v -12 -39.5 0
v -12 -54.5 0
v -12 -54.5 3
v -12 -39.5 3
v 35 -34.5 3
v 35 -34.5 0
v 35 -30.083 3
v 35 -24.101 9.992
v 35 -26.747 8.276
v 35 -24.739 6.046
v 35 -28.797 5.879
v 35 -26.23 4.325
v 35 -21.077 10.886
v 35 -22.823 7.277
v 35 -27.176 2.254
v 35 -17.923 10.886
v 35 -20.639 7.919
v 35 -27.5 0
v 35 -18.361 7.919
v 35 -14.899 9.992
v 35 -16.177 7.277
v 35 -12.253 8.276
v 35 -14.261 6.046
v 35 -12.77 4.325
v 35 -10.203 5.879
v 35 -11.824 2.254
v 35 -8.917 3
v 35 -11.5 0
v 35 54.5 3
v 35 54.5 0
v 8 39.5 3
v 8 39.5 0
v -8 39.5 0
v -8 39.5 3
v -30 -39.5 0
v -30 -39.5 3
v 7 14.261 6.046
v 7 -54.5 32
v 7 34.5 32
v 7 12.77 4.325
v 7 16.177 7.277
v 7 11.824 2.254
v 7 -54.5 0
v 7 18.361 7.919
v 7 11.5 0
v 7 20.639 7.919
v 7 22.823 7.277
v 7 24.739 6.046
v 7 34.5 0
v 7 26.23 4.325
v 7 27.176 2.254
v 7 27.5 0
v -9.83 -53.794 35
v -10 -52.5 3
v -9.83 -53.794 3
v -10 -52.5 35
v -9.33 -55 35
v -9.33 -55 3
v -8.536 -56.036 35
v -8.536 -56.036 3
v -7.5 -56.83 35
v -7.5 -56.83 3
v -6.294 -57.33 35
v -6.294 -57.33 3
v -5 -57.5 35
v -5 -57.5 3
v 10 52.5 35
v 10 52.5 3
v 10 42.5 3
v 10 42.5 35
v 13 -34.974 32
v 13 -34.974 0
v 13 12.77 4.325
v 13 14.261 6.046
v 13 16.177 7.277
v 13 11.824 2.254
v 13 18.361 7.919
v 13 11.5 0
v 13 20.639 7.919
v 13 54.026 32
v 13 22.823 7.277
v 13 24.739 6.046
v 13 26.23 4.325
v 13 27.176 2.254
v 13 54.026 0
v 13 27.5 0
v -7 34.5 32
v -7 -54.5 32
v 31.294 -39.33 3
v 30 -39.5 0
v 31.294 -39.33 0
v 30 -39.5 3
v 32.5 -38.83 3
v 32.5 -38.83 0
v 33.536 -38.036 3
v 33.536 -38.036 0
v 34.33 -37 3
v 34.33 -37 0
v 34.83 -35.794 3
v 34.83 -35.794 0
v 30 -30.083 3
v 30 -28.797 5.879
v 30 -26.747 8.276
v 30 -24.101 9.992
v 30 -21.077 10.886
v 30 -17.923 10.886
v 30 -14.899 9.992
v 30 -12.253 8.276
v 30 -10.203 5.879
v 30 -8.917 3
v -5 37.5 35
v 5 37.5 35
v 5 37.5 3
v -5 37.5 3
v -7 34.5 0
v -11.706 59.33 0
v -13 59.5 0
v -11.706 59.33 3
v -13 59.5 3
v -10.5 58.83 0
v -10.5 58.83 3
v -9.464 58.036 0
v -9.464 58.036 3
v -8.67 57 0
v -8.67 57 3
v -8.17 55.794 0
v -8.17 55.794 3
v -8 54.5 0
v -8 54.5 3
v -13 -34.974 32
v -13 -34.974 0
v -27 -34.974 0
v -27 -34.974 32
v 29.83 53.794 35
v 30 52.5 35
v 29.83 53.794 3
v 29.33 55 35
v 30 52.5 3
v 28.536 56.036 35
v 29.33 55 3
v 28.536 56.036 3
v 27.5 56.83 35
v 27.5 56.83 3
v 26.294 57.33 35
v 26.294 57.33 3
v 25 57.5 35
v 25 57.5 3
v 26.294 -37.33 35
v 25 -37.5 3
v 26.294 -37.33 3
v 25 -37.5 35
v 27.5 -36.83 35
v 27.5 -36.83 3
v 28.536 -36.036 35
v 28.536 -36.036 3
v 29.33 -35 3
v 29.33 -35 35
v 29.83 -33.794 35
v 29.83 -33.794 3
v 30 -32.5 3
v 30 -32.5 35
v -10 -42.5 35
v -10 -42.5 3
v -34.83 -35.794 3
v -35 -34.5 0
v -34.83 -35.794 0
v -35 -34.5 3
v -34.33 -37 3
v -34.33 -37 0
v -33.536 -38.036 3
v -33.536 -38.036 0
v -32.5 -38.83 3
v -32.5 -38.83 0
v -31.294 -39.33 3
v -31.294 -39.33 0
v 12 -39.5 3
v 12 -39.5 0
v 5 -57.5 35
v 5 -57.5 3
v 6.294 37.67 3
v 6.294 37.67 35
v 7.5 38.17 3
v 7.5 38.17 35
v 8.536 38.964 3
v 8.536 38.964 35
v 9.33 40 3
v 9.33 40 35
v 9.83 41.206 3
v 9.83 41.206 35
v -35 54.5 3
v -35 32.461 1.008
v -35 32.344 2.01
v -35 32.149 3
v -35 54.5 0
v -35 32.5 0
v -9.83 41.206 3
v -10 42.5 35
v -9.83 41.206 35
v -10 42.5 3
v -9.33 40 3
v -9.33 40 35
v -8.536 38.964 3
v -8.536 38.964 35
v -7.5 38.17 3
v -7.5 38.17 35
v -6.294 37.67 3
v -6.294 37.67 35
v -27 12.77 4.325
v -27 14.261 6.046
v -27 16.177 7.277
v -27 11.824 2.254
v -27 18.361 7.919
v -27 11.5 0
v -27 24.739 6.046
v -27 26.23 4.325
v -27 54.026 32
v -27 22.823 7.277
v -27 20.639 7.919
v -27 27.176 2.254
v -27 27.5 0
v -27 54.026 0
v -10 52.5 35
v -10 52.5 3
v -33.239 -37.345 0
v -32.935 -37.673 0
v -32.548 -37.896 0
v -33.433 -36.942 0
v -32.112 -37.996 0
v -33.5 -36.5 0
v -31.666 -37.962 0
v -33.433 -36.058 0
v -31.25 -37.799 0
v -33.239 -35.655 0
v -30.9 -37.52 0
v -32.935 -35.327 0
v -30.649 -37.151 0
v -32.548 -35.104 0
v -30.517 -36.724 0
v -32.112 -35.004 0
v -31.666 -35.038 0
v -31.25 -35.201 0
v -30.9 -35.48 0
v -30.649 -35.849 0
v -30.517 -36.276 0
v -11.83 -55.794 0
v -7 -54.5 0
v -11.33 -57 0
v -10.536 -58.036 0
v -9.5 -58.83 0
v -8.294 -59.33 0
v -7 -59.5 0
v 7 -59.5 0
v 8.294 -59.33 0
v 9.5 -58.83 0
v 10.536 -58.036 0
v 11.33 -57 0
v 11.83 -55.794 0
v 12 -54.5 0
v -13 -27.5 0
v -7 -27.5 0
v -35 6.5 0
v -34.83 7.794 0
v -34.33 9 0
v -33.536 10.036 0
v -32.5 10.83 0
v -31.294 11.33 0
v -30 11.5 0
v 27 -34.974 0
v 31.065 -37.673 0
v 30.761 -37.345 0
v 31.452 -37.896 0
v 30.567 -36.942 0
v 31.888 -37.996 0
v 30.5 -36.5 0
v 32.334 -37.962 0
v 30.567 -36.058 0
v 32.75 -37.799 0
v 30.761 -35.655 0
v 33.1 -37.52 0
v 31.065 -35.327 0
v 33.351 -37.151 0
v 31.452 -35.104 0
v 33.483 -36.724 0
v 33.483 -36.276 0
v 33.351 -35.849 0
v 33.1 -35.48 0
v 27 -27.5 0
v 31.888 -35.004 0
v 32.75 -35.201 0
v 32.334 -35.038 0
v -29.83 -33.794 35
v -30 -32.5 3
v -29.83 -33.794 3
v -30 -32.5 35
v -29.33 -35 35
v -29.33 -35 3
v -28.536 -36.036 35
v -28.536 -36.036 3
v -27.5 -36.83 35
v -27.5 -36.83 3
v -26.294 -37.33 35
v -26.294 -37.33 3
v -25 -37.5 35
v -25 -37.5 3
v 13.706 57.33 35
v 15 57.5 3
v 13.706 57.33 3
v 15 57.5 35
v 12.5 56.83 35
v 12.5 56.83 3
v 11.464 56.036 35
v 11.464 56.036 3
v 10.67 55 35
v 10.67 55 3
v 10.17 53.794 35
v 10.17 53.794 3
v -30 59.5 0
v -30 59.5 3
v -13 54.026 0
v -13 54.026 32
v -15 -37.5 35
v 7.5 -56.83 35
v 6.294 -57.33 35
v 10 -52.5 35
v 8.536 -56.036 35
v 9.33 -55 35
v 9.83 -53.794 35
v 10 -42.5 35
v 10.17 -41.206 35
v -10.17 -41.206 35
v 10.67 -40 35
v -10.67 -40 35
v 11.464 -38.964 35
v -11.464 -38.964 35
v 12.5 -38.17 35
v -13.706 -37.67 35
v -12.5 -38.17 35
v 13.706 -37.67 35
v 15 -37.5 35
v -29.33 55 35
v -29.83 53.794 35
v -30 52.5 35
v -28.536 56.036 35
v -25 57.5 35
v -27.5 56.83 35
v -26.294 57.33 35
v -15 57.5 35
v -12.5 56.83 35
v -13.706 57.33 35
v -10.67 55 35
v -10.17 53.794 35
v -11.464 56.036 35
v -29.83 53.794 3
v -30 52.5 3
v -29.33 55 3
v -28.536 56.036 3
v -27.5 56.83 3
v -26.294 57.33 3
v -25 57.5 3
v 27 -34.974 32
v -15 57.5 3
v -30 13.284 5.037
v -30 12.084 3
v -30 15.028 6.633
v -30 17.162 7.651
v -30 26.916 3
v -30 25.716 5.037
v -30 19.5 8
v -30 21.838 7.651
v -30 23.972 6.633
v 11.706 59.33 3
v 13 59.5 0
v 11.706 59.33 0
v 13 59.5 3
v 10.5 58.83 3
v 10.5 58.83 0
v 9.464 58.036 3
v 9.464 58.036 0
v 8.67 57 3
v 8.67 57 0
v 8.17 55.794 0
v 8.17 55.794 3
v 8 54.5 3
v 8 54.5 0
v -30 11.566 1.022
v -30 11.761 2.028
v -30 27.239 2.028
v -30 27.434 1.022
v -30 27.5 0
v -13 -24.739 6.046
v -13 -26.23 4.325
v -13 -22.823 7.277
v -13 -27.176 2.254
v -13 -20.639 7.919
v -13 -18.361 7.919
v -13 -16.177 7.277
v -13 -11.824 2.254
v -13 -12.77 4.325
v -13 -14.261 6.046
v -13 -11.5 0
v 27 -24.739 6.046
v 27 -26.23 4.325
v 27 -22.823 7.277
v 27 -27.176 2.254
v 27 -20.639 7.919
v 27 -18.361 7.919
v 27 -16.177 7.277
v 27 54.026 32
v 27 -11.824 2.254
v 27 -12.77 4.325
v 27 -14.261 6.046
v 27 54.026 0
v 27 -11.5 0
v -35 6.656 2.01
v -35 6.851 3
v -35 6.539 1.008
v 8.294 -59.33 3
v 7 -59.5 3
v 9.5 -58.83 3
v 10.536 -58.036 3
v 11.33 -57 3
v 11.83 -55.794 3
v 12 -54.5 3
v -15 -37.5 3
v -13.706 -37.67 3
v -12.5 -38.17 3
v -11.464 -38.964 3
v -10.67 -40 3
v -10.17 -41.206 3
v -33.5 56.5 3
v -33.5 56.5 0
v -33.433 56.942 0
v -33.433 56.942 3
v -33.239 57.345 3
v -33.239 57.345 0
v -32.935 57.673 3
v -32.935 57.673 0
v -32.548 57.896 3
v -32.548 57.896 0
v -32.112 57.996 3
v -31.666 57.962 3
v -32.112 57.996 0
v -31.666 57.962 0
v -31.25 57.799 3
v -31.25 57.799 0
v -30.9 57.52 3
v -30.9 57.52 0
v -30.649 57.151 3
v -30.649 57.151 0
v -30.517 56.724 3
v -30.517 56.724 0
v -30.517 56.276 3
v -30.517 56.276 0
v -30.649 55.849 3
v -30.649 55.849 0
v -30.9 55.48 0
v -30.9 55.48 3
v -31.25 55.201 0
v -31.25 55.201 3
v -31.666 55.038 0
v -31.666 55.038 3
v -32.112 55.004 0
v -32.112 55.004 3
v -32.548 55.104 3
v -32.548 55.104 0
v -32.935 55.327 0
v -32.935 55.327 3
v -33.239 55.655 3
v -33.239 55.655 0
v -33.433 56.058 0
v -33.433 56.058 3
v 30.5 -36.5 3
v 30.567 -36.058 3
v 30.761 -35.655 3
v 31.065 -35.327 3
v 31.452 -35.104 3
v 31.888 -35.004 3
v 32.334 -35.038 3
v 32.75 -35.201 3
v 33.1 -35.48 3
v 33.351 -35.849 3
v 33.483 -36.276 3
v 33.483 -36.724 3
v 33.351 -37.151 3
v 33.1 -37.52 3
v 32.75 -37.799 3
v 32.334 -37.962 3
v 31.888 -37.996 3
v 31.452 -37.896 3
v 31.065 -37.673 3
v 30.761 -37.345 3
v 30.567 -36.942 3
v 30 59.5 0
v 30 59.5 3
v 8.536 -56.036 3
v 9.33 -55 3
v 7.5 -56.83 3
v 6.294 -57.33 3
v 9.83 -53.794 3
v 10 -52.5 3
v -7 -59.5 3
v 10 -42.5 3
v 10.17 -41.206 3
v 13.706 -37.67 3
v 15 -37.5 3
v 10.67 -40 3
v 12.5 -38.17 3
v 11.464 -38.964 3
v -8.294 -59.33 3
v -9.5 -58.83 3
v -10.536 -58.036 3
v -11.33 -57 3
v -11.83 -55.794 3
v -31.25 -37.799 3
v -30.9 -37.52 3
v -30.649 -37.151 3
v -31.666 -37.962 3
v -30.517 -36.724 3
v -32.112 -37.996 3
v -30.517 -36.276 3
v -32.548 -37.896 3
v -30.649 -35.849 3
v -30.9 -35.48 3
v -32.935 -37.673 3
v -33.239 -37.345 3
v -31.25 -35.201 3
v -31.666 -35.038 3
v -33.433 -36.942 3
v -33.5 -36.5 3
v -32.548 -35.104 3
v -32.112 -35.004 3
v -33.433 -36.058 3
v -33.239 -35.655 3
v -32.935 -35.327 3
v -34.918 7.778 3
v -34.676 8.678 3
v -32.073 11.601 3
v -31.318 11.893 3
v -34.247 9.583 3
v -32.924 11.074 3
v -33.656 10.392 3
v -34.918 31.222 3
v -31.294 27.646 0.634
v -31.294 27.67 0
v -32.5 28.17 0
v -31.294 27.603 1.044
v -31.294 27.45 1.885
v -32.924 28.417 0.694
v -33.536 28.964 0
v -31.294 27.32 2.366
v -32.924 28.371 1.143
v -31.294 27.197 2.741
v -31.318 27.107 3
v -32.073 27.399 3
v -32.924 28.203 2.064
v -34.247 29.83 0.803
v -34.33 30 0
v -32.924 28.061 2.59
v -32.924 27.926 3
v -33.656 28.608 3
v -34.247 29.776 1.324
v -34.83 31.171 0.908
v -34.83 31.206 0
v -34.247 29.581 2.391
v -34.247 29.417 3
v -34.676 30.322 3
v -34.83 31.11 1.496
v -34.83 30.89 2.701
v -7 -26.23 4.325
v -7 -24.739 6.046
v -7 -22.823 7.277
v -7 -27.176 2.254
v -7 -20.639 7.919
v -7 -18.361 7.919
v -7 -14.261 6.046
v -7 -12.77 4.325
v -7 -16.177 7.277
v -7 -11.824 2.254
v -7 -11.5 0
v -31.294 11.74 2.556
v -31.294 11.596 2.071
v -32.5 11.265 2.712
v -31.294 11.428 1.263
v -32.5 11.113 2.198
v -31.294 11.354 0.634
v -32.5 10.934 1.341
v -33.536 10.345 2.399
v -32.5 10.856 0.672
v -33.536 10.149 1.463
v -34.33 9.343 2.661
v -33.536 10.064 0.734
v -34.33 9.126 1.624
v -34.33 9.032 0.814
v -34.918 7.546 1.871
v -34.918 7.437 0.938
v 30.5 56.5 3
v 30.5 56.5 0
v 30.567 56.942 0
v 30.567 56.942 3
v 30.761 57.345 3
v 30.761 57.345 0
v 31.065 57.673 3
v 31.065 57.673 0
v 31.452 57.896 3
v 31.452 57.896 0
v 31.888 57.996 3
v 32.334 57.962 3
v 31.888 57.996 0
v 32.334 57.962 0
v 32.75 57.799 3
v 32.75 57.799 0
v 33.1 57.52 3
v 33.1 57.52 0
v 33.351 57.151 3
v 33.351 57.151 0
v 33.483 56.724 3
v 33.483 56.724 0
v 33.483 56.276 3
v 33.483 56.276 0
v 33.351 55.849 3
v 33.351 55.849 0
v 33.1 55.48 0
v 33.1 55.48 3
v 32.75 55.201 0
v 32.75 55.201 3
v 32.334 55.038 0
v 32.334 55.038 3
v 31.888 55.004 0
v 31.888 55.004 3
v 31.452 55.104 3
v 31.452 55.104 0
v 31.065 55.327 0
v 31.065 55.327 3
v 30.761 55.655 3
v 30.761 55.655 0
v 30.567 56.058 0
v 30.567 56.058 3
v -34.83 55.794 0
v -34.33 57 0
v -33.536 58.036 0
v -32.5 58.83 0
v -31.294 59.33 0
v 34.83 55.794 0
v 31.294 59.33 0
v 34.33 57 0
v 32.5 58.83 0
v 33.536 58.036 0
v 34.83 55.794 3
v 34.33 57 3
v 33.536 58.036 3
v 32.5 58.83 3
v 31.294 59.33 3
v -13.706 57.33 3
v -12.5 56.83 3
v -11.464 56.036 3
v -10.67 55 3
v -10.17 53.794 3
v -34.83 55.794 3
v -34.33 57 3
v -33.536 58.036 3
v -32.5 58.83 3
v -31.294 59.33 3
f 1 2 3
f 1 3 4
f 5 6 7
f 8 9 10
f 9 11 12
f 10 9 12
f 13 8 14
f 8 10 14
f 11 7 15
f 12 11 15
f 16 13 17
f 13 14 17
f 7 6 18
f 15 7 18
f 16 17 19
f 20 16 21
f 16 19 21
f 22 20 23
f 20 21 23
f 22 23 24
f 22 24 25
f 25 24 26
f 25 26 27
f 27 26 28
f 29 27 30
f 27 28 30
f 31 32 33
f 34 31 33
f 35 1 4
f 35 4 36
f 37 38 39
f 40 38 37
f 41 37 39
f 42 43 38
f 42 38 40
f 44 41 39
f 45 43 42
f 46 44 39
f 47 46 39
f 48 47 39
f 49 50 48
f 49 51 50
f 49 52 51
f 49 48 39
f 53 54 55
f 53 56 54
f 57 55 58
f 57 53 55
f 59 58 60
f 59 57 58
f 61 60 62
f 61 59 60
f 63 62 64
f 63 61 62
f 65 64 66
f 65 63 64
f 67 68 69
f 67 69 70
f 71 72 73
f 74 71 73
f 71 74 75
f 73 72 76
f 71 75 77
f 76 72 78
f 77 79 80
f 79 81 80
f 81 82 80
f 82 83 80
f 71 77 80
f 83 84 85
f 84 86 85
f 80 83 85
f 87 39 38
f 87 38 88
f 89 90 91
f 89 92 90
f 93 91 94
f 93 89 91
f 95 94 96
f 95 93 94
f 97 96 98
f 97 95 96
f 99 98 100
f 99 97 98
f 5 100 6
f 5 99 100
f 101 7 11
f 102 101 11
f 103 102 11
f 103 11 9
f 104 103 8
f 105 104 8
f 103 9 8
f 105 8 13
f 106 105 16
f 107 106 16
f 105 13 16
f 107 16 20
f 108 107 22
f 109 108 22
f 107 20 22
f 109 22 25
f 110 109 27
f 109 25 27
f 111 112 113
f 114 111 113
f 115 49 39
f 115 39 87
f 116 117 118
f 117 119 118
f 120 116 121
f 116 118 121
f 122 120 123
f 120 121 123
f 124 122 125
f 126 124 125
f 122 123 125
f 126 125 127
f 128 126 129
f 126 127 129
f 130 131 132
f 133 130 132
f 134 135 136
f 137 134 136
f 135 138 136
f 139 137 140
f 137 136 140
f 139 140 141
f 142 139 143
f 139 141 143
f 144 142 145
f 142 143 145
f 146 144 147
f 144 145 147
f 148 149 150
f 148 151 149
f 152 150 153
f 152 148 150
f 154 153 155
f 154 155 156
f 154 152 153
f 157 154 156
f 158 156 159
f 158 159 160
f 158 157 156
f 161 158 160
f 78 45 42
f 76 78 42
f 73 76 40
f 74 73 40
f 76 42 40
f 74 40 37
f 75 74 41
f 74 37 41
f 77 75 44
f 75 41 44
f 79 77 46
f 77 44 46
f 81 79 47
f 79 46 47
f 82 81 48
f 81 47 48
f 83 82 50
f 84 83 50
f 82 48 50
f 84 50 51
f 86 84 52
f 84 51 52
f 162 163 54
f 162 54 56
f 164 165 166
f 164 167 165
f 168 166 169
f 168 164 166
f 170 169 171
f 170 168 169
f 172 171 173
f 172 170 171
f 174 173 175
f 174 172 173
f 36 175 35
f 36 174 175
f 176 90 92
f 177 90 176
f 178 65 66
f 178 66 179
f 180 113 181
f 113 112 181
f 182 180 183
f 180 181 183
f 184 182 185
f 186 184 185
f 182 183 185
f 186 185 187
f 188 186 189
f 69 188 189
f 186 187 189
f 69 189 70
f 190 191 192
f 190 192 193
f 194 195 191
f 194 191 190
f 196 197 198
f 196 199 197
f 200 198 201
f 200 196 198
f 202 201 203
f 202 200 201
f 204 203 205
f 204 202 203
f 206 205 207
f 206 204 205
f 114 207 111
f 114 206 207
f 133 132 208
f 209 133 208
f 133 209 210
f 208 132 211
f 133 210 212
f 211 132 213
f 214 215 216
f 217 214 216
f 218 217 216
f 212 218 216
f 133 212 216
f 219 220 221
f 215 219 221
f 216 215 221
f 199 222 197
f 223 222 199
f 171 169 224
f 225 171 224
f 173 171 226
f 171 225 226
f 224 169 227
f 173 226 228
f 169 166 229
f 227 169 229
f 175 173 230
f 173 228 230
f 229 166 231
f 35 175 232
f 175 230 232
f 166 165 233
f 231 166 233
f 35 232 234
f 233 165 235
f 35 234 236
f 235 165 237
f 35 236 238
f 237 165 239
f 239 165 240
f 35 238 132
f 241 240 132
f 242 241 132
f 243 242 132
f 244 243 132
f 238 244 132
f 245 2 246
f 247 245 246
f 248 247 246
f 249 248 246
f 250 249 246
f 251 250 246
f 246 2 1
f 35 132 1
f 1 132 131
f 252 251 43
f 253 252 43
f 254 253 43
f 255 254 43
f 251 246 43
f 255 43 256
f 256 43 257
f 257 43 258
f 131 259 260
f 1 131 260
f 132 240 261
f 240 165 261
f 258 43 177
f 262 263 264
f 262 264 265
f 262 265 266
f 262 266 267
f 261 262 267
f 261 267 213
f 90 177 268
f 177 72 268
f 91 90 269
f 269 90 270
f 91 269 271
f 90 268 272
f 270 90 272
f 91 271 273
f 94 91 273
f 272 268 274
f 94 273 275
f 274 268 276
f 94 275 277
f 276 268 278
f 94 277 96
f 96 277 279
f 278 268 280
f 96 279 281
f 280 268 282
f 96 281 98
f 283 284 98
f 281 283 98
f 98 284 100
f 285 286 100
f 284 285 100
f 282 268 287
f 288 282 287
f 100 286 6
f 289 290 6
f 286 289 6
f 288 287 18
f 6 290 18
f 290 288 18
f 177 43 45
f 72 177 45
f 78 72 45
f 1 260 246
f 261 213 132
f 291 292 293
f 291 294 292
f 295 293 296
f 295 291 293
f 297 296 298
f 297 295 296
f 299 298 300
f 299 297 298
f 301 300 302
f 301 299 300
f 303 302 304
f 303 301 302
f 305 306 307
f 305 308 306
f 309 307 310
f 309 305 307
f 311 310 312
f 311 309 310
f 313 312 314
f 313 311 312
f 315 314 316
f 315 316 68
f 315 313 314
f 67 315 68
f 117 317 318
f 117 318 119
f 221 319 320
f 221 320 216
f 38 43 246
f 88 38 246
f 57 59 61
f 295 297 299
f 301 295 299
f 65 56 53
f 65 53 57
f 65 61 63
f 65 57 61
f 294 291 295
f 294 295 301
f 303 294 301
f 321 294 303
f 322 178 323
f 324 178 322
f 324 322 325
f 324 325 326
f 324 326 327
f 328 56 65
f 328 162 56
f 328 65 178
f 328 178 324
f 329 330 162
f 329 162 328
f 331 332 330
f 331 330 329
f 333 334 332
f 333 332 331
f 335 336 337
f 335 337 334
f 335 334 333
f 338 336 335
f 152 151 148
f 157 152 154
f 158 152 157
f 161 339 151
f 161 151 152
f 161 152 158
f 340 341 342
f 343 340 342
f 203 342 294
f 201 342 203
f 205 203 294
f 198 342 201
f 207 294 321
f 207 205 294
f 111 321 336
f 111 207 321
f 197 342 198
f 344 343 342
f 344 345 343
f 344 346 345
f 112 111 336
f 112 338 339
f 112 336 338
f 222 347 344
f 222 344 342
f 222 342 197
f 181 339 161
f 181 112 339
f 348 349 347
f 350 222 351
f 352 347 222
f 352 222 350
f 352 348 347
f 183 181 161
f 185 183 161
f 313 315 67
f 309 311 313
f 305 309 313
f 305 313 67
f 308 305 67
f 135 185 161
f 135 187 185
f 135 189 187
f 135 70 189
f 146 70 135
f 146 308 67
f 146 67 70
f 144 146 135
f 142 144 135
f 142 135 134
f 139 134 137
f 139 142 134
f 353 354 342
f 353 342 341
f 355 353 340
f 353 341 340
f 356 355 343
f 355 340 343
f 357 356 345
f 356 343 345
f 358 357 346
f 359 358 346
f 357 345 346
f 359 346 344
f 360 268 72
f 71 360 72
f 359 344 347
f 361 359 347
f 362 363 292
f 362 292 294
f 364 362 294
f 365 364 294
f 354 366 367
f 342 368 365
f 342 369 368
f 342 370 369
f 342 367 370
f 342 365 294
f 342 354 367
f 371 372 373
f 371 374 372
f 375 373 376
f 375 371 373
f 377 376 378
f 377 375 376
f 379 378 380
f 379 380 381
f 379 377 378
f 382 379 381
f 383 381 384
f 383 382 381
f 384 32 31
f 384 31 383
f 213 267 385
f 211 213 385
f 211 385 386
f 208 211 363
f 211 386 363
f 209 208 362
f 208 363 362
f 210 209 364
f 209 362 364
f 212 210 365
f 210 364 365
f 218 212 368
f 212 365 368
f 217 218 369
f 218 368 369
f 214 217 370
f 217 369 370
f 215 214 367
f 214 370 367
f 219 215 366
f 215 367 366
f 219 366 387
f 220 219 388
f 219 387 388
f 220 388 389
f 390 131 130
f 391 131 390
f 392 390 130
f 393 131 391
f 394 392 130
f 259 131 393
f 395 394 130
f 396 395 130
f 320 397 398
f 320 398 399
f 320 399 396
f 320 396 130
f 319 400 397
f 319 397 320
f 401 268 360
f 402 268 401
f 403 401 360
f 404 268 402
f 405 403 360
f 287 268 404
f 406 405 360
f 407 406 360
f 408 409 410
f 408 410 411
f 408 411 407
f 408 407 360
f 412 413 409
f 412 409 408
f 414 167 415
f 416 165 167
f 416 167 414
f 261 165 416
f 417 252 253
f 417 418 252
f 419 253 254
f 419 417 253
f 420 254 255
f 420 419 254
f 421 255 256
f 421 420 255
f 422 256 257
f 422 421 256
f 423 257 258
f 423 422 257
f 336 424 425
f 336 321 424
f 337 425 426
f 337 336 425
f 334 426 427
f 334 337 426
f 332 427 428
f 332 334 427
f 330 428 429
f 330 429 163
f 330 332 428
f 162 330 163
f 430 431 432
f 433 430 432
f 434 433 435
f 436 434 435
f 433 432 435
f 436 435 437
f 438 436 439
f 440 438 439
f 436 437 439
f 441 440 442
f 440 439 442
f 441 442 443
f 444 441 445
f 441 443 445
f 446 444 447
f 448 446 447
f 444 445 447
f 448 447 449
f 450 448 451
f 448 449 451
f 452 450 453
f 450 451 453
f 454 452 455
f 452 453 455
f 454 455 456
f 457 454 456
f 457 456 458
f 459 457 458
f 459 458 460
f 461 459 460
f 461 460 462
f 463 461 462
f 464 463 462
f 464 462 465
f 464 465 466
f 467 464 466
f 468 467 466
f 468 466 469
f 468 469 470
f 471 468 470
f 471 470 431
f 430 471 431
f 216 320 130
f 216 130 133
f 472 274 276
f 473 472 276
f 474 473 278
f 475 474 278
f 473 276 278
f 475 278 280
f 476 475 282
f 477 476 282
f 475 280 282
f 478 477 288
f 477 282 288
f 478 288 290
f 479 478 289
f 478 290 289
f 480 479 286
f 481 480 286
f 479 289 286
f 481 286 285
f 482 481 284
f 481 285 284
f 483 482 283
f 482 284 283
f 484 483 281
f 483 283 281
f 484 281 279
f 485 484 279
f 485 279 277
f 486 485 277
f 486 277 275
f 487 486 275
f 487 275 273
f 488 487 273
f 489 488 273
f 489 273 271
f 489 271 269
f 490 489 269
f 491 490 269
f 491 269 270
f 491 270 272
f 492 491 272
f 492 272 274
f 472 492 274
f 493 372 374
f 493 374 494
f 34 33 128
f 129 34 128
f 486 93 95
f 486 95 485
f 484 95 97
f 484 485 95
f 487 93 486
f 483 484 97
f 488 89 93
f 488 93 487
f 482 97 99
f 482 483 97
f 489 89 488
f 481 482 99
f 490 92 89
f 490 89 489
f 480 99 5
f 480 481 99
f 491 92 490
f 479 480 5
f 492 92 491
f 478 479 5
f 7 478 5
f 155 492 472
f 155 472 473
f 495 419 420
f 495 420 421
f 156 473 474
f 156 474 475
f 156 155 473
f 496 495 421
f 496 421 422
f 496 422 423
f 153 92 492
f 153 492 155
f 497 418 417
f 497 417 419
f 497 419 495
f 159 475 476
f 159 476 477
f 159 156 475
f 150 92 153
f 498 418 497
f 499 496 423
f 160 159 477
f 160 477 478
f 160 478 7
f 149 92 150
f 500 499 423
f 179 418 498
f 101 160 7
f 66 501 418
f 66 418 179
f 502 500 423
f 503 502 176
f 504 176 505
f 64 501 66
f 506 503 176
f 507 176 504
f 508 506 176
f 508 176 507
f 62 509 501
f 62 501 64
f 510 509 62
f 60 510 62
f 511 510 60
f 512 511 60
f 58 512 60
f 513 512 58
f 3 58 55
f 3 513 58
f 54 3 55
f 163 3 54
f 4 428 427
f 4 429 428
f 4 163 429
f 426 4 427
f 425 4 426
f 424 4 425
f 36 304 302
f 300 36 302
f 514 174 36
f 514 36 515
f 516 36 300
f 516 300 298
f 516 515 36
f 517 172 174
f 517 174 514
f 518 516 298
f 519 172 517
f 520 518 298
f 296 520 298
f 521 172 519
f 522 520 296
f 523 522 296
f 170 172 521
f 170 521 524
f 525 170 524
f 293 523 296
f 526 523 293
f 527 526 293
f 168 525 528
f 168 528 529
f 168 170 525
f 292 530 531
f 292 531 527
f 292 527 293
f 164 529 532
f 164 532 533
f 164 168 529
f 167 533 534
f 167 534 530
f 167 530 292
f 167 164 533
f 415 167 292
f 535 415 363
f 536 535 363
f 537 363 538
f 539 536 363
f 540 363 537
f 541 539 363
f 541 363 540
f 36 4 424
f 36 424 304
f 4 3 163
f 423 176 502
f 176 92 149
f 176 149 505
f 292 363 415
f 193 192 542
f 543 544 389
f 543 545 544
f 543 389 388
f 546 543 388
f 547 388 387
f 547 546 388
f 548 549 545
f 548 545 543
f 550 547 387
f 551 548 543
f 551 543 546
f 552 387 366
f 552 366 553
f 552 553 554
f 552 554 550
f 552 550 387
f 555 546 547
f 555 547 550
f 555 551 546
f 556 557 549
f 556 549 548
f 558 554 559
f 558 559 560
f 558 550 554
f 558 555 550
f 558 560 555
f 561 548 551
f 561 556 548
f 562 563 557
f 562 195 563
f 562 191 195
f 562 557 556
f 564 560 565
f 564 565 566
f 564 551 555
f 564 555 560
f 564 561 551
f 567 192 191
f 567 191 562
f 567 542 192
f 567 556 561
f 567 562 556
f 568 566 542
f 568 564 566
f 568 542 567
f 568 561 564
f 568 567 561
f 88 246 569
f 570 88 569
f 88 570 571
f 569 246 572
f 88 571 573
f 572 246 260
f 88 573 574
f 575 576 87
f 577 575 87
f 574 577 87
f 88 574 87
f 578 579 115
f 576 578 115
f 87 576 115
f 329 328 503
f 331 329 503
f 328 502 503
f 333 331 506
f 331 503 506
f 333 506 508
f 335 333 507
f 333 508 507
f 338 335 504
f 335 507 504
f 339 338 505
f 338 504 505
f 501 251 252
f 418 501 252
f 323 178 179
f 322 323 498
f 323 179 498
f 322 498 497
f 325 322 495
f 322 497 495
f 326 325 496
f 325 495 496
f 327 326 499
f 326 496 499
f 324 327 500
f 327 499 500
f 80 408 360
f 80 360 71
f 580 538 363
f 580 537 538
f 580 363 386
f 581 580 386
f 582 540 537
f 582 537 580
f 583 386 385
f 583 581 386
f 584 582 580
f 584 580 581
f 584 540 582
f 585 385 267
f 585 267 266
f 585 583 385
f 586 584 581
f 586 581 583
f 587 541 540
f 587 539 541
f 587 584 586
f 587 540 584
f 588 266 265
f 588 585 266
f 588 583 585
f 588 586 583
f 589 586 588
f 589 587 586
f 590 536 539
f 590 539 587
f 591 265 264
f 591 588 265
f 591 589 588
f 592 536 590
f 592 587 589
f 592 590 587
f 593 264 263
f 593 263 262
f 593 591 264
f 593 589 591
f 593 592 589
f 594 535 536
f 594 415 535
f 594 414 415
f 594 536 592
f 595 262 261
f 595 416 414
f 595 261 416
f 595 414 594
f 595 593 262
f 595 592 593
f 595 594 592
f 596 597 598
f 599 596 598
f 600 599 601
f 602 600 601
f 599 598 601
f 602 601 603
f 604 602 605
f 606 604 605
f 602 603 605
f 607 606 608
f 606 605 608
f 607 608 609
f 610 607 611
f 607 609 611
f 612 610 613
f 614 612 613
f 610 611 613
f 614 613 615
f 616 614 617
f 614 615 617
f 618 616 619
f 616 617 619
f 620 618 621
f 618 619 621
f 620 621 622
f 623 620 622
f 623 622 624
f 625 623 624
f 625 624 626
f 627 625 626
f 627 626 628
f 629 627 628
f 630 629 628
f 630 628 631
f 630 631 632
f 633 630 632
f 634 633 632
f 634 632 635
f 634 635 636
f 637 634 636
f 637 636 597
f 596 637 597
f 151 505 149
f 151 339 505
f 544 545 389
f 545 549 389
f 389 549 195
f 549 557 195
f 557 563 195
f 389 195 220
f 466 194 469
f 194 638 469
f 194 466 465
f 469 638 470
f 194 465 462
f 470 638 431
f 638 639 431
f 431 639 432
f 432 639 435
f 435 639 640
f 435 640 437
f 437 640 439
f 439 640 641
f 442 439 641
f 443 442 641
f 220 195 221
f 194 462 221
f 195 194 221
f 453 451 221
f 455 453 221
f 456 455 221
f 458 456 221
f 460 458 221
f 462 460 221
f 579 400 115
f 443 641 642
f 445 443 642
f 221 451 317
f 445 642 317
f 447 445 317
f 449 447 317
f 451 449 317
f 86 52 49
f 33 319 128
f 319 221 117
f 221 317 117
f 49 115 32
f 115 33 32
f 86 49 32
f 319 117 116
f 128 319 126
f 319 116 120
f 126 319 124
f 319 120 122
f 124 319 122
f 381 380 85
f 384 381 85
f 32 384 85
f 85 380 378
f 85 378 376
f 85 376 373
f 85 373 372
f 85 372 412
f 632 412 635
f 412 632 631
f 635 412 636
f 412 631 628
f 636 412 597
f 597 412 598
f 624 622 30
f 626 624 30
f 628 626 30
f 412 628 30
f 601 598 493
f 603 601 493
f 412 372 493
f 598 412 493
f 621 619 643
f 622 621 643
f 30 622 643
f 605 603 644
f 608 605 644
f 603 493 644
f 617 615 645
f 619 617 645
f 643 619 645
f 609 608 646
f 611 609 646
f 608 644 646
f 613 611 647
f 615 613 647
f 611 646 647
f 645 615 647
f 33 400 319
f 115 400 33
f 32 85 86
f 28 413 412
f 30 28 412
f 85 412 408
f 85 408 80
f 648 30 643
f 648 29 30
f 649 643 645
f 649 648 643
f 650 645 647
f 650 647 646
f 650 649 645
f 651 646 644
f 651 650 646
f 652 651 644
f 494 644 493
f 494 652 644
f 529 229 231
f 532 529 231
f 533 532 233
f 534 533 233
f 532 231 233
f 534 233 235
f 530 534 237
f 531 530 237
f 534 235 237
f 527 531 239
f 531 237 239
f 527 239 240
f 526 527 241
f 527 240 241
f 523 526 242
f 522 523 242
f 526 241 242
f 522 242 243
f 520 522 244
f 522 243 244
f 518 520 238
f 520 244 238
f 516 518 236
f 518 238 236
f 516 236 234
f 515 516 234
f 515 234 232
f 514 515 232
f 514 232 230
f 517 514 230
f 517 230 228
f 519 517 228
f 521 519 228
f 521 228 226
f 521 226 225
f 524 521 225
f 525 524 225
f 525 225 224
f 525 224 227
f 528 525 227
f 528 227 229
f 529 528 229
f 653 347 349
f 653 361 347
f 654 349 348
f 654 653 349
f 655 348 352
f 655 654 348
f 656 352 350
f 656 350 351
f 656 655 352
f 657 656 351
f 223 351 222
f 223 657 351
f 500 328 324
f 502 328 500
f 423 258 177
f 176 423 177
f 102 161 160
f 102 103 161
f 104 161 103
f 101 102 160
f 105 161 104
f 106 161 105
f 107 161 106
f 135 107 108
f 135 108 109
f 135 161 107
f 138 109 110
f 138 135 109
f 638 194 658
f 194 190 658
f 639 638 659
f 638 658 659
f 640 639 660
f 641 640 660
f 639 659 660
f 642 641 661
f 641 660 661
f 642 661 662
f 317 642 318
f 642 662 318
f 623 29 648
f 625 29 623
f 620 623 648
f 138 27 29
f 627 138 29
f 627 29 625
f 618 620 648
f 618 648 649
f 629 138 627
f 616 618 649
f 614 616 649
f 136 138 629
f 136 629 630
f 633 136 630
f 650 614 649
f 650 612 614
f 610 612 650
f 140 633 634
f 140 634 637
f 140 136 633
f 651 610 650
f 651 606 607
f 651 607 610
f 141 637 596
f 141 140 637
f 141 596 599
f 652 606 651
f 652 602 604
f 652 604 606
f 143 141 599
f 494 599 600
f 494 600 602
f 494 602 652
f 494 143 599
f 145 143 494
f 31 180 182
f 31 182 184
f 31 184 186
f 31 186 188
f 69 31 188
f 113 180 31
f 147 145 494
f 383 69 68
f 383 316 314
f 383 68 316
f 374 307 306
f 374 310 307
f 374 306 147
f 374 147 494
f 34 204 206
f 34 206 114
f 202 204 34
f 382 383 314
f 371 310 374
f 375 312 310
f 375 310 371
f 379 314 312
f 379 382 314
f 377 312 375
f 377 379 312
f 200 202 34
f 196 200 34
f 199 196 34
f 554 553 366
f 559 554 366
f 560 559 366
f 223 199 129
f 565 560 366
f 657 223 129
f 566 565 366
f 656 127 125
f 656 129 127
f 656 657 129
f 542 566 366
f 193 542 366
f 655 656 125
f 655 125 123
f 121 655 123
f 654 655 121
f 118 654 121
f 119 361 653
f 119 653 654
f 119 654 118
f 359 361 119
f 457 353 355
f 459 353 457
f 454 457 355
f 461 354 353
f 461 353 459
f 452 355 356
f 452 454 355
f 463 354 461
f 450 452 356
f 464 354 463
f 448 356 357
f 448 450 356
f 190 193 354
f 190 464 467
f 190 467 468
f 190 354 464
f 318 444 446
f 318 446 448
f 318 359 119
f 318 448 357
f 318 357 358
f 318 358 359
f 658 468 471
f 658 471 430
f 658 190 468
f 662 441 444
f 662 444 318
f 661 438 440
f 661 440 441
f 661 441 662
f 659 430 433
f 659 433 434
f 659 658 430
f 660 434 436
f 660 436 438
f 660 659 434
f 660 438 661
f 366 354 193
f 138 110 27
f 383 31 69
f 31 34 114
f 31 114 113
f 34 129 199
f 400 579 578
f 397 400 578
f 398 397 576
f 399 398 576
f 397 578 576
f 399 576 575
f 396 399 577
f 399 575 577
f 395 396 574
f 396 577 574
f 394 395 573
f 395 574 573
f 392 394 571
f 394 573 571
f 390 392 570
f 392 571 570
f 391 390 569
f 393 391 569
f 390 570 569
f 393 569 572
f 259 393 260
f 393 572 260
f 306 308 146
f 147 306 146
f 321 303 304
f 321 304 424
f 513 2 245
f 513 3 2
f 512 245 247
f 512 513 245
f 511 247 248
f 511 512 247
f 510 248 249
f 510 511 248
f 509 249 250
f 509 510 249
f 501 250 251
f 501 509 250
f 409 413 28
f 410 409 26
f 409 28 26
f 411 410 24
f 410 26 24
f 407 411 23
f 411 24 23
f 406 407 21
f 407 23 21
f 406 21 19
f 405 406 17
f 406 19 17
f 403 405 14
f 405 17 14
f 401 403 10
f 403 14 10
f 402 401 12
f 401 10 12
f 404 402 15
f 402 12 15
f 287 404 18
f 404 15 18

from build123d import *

# Parameters (mm, degrees)
SKETCH1_W           = 70
SKETCH1_H           = 119
BOSS_EXTRUDE1_DEPTH = 35
SKETCH2_R           = 8
CUT_EXTRUDE1_DEPTH  = 8
SKETCH3_R           = 8
CUT_EXTRUDE2_DEPTH  = 8
SKETCH4_W           = 14
SKETCH4_H           = 89
CUT_EXTRUDE3_DEPTH  = 32
CUT_EXTRUDE4_REACH  = 82.804
CUT_EXTRUDE5_REACH  = 82.804
SKETCH7_W           = 23
SKETCH7_H           = 20
SKETCH7_W_2         = 16
CUT_EXTRUDE6_DEPTH  = 78.396705356
CUT_EXTRUDE7_DEPTH  = 5
SKETCH9_W           = 18
SKETCH9_H           = 32
CUT_EXTRUDE8_DEPTH  = 2
SKETCH10_W          = 24
SKETCH10_H          = 32
CUT_EXTRUDE9_DEPTH  = 2
SKETCH11_W          = 23
SKETCH11_H          = 32
CUT_EXTRUDE10_DEPTH = 2
SKETCH12_W          = 32
SKETCH12_H          = 20
CUT_EXTRUDE11_DEPTH = 2
SKETCH13_W          = 32
SKETCH13_H          = 20
CUT_EXTRUDE12_DEPTH = 2
SKETCH14_W          = 65
SKETCH14_H          = 32
CUT_EXTRUDE13_DEPTH = 2
SKETCH15_W          = 16
SKETCH15_H          = 32
CUT_EXTRUDE15_DEPTH = 2
SKETCH17_W          = 32
SKETCH17_H          = 20
CUT_EXTRUDE16_DEPTH = 2
SKETCH18_W          = 32
SKETCH18_H          = 20
CUT_EXTRUDE17_DEPTH = 2
SKETCH20_W          = 32
SKETCH20_H          = 95
CUT_EXTRUDE18_DEPTH = 5
SKETCH21_R          = 1.5
CUT_EXTRUDE20_DEPTH = 10
FILLET1_R           = 5
FILLET2_R           = 5


with BuildPart() as part:
    # Sketch1 → Boss-Extrude1 (new body)
    with BuildSketch(Plane.XY):
        Rectangle(SKETCH1_W, SKETCH1_H)
    extrude(amount=BOSS_EXTRUDE1_DEPTH)

    # Sketch2 → Cut-Extrude1 (cut)
    with BuildSketch(Plane(origin=(35, 0, 0), x_dir=(0, 0, -1), z_dir=(1, 0, 0))):
        with Locations((0, -19.5)):
            Circle(SKETCH2_R)
    extrude(amount=-CUT_EXTRUDE1_DEPTH, mode=Mode.SUBTRACT)

    # Sketch3 → Cut-Extrude2 (cut)
    with BuildSketch(Plane.ZY.offset(35)):
        with Locations((0, 19.5)):
            Circle(SKETCH3_R)
    extrude(amount=-CUT_EXTRUDE2_DEPTH, mode=Mode.SUBTRACT)

    # Sketch4 → Cut-Extrude3 (cut)
    with BuildSketch(Plane(origin=(0, 0, 0), x_dir=(-1, 0, 0), z_dir=(0, 0, -1))):
        with Locations((-20, 9.526034086)):
            Rectangle(SKETCH4_W, SKETCH4_H)
        with Locations((0, -10)):
            Rectangle(SKETCH4_W, SKETCH4_H)
        with Locations((20, 9.526034086)):
            Rectangle(SKETCH4_W, SKETCH4_H)
    extrude(amount=-CUT_EXTRUDE3_DEPTH, mode=Mode.SUBTRACT)

    # Sketch5 → Cut-Extrude4 (cut, up to next)
    with BuildSketch(Plane.ZY.offset(-7), mode=Mode.PRIVATE) as cut_extrude4_sk1:
        with BuildLine():
            Line((0, 27.5), (0, 11.5))
            ThreePointArc((0, 11.5), (8, 19.5), (0, 27.5))
        make_face()
    cut_extrude4_tool1 = extrude(cut_extrude4_sk1.sketch, amount=-CUT_EXTRUDE4_REACH, mode=Mode.PRIVATE) & part.part
    add(cut_extrude4_tool1.solids().sort_by_distance((7, 19.5, 3.395305))[0], mode=Mode.SUBTRACT)

    # Sketch6 → Cut-Extrude5 (cut, up to next)
    with BuildSketch(Plane(origin=(-7, 0, 0), x_dir=(0, 0, -1), z_dir=(1, 0, 0)), mode=Mode.PRIVATE) as cut_extrude5_sk1:
        with BuildLine():
            Line((0, -27.5), (0, -11.5))
            ThreePointArc((0, -11.5), (-8, -19.5), (0, -27.5))
        make_face()
    cut_extrude5_tool1 = extrude(cut_extrude5_sk1.sketch, amount=-CUT_EXTRUDE5_REACH, mode=Mode.PRIVATE) & part.part
    add(cut_extrude5_tool1.solids().sort_by_distance((-7, -19.5, 3.395305))[0], mode=Mode.SUBTRACT)

    # Sketch7 → Cut-Extrude6 (cut, through all)
    with BuildSketch(Plane(origin=(0, 0, 0), x_dir=(-1, 0, 0), z_dir=(0, 0, -1))):
        with Locations((23.5, -49.5)):
            Rectangle(SKETCH7_W, SKETCH7_H)
        with Locations((0, 49.5)):
            Rectangle(SKETCH7_W_2, SKETCH7_H)
        with Locations((-23.5, -49.5)):
            Rectangle(SKETCH7_W, SKETCH7_H)
    extrude(amount=-CUT_EXTRUDE6_DEPTH, mode=Mode.SUBTRACT)

    # Sketch8 → Cut-Extrude7 (cut)
    with BuildSketch(Plane(origin=(35, 0, 0), x_dir=(0, 0, -1), z_dir=(1, 0, 0))):
        with BuildLine():
            Line((-3, 59.5), (-35, 59.5))
            Line((-35, 59.5), (-35, -39.5))
            Line((-35, -39.5), (-3, -39.5))
            Line((-3, -39.5), (-3, -30.083005244))
            ThreePointArc((-3, -30.083005244), (-11, -19.5), (-3, -8.916994756))
            Line((-3, -8.916994756), (-3, 59.5))
        make_face()
    extrude(amount=-CUT_EXTRUDE7_DEPTH, mode=Mode.SUBTRACT)

    # Sketch9 → Cut-Extrude8 (cut)
    with BuildSketch(Plane.XZ.offset(39.5)):
        with Locations((21, 19)):
            Rectangle(SKETCH9_W, SKETCH9_H)
    extrude(amount=-CUT_EXTRUDE8_DEPTH, mode=Mode.SUBTRACT)

    # Sketch10 → Cut-Extrude9 (cut)
    with BuildSketch(Plane.XZ.offset(59.5)):
        with Locations((0, 19)):
            Rectangle(SKETCH10_W, SKETCH10_H)
    extrude(amount=-CUT_EXTRUDE9_DEPTH, mode=Mode.SUBTRACT)

    # Sketch11 → Cut-Extrude10 (cut)
    with BuildSketch(Plane.XZ.offset(39.5)):
        with Locations((-23.5, 19)):
            Rectangle(SKETCH11_W, SKETCH11_H)
    extrude(amount=-CUT_EXTRUDE10_DEPTH, mode=Mode.SUBTRACT)

    # Sketch12 → Cut-Extrude11 (cut)
    with BuildSketch(Plane.ZY.offset(12)):
        with Locations((19, -47.5)):
            Rectangle(SKETCH12_W, SKETCH12_H)
    extrude(amount=-CUT_EXTRUDE11_DEPTH, mode=Mode.SUBTRACT)

    # Sketch13 → Cut-Extrude12 (cut)
    with BuildSketch(Plane(origin=(12, 0, 0), x_dir=(0, 0, -1), z_dir=(1, 0, 0))):
        with Locations((-19, -47.5)):
            Rectangle(SKETCH13_W, SKETCH13_H)
    extrude(amount=-CUT_EXTRUDE12_DEPTH, mode=Mode.SUBTRACT)

    # Sketch14 → Cut-Extrude13 (cut)
    with BuildSketch(Plane(origin=(0, 59.5, 0), x_dir=(1, 0, 0), z_dir=(0, 1, 0))):
        with Locations((-2.5, -19)):
            Rectangle(SKETCH14_W, SKETCH14_H)
    extrude(amount=-CUT_EXTRUDE13_DEPTH, mode=Mode.SUBTRACT)

    # Sketch15 → Cut-Extrude15 (cut)
    with BuildSketch(Plane(origin=(0, 39.5, 0), x_dir=(1, 0, 0), z_dir=(0, 1, 0))):
        with Locations((0, -19)):
            Rectangle(SKETCH15_W, SKETCH15_H)
    extrude(amount=-CUT_EXTRUDE15_DEPTH, mode=Mode.SUBTRACT)

    # Sketch17 → Cut-Extrude16 (cut)
    with BuildSketch(Plane(origin=(-8, 0, 0), x_dir=(0, 0, -1), z_dir=(1, 0, 0))):
        with Locations((-19, 47.5)):
            Rectangle(SKETCH17_W, SKETCH17_H)
    extrude(amount=-CUT_EXTRUDE16_DEPTH, mode=Mode.SUBTRACT)

    # Sketch18 → Cut-Extrude17 (cut)
    with BuildSketch(Plane.ZY.offset(-8)):
        with Locations((19, 47.5)):
            Rectangle(SKETCH18_W, SKETCH18_H)
    extrude(amount=-CUT_EXTRUDE17_DEPTH, mode=Mode.SUBTRACT)

    # Sketch20 → Cut-Extrude18 (cut)
    with BuildSketch(Plane.ZY.offset(35)):
        with Locations((19, 10)):
            Rectangle(SKETCH20_W, SKETCH20_H)
    extrude(amount=-CUT_EXTRUDE18_DEPTH, mode=Mode.SUBTRACT)

    # Sketch21 → Cut-Extrude20 (cut)
    with BuildSketch(Plane(origin=(0, 0, 0), x_dir=(-1, 0, 0), z_dir=(0, 0, -1))):
        with Locations((-32, 56.5)):
            Circle(SKETCH21_R)
        with Locations((32, 56.5)):
            Circle(SKETCH21_R)
        with Locations((32, -36.5)):
            Circle(SKETCH21_R)
        with Locations((-32, -36.5)):
            Circle(SKETCH21_R)
    extrude(amount=-CUT_EXTRUDE20_DEPTH, mode=Mode.SUBTRACT)

    # Fillet1
    fillet1_edges = [part.edges().sort_by_distance(p)[0] for p in [
        (30, -37.5, 19),
        (-10, -57.5, 19),
        (-10, -37.5, 19),
        (10, -37.5, 19),
        (10, -57.5, 19),
        (30, 57.5, 19),
        (-10, 37.5, 19),
        (-10, 57.5, 19),
        (10, 57.5, 19),
        (10, 37.5, 19),
        (-30, 57.5, 19),
        (-30, -37.5, 19),
    ]]
    fillet(fillet1_edges, radius=FILLET1_R)

    # Fillet2
    fillet2_edges = [part.edges().sort_by_distance(p)[0] for p in [
        (35, 59.5, 1.5),
        (8, 59.5, 1.5),
        (-8, 59.5, 1.5),
        (-35, 59.5, 1.5),
        (-35, 11.64730658, 1.5281381),
        (-35, 27.35269342, 1.5281381),
        (-35, -39.5, 1.5),
        (-12, -59.5, 1.5),
        (12, -59.5, 1.5),
        (35, -39.5, 1.5),
    ]]
    fillet(fillet2_edges, radius=FILLET2_R)


solid = part.part
